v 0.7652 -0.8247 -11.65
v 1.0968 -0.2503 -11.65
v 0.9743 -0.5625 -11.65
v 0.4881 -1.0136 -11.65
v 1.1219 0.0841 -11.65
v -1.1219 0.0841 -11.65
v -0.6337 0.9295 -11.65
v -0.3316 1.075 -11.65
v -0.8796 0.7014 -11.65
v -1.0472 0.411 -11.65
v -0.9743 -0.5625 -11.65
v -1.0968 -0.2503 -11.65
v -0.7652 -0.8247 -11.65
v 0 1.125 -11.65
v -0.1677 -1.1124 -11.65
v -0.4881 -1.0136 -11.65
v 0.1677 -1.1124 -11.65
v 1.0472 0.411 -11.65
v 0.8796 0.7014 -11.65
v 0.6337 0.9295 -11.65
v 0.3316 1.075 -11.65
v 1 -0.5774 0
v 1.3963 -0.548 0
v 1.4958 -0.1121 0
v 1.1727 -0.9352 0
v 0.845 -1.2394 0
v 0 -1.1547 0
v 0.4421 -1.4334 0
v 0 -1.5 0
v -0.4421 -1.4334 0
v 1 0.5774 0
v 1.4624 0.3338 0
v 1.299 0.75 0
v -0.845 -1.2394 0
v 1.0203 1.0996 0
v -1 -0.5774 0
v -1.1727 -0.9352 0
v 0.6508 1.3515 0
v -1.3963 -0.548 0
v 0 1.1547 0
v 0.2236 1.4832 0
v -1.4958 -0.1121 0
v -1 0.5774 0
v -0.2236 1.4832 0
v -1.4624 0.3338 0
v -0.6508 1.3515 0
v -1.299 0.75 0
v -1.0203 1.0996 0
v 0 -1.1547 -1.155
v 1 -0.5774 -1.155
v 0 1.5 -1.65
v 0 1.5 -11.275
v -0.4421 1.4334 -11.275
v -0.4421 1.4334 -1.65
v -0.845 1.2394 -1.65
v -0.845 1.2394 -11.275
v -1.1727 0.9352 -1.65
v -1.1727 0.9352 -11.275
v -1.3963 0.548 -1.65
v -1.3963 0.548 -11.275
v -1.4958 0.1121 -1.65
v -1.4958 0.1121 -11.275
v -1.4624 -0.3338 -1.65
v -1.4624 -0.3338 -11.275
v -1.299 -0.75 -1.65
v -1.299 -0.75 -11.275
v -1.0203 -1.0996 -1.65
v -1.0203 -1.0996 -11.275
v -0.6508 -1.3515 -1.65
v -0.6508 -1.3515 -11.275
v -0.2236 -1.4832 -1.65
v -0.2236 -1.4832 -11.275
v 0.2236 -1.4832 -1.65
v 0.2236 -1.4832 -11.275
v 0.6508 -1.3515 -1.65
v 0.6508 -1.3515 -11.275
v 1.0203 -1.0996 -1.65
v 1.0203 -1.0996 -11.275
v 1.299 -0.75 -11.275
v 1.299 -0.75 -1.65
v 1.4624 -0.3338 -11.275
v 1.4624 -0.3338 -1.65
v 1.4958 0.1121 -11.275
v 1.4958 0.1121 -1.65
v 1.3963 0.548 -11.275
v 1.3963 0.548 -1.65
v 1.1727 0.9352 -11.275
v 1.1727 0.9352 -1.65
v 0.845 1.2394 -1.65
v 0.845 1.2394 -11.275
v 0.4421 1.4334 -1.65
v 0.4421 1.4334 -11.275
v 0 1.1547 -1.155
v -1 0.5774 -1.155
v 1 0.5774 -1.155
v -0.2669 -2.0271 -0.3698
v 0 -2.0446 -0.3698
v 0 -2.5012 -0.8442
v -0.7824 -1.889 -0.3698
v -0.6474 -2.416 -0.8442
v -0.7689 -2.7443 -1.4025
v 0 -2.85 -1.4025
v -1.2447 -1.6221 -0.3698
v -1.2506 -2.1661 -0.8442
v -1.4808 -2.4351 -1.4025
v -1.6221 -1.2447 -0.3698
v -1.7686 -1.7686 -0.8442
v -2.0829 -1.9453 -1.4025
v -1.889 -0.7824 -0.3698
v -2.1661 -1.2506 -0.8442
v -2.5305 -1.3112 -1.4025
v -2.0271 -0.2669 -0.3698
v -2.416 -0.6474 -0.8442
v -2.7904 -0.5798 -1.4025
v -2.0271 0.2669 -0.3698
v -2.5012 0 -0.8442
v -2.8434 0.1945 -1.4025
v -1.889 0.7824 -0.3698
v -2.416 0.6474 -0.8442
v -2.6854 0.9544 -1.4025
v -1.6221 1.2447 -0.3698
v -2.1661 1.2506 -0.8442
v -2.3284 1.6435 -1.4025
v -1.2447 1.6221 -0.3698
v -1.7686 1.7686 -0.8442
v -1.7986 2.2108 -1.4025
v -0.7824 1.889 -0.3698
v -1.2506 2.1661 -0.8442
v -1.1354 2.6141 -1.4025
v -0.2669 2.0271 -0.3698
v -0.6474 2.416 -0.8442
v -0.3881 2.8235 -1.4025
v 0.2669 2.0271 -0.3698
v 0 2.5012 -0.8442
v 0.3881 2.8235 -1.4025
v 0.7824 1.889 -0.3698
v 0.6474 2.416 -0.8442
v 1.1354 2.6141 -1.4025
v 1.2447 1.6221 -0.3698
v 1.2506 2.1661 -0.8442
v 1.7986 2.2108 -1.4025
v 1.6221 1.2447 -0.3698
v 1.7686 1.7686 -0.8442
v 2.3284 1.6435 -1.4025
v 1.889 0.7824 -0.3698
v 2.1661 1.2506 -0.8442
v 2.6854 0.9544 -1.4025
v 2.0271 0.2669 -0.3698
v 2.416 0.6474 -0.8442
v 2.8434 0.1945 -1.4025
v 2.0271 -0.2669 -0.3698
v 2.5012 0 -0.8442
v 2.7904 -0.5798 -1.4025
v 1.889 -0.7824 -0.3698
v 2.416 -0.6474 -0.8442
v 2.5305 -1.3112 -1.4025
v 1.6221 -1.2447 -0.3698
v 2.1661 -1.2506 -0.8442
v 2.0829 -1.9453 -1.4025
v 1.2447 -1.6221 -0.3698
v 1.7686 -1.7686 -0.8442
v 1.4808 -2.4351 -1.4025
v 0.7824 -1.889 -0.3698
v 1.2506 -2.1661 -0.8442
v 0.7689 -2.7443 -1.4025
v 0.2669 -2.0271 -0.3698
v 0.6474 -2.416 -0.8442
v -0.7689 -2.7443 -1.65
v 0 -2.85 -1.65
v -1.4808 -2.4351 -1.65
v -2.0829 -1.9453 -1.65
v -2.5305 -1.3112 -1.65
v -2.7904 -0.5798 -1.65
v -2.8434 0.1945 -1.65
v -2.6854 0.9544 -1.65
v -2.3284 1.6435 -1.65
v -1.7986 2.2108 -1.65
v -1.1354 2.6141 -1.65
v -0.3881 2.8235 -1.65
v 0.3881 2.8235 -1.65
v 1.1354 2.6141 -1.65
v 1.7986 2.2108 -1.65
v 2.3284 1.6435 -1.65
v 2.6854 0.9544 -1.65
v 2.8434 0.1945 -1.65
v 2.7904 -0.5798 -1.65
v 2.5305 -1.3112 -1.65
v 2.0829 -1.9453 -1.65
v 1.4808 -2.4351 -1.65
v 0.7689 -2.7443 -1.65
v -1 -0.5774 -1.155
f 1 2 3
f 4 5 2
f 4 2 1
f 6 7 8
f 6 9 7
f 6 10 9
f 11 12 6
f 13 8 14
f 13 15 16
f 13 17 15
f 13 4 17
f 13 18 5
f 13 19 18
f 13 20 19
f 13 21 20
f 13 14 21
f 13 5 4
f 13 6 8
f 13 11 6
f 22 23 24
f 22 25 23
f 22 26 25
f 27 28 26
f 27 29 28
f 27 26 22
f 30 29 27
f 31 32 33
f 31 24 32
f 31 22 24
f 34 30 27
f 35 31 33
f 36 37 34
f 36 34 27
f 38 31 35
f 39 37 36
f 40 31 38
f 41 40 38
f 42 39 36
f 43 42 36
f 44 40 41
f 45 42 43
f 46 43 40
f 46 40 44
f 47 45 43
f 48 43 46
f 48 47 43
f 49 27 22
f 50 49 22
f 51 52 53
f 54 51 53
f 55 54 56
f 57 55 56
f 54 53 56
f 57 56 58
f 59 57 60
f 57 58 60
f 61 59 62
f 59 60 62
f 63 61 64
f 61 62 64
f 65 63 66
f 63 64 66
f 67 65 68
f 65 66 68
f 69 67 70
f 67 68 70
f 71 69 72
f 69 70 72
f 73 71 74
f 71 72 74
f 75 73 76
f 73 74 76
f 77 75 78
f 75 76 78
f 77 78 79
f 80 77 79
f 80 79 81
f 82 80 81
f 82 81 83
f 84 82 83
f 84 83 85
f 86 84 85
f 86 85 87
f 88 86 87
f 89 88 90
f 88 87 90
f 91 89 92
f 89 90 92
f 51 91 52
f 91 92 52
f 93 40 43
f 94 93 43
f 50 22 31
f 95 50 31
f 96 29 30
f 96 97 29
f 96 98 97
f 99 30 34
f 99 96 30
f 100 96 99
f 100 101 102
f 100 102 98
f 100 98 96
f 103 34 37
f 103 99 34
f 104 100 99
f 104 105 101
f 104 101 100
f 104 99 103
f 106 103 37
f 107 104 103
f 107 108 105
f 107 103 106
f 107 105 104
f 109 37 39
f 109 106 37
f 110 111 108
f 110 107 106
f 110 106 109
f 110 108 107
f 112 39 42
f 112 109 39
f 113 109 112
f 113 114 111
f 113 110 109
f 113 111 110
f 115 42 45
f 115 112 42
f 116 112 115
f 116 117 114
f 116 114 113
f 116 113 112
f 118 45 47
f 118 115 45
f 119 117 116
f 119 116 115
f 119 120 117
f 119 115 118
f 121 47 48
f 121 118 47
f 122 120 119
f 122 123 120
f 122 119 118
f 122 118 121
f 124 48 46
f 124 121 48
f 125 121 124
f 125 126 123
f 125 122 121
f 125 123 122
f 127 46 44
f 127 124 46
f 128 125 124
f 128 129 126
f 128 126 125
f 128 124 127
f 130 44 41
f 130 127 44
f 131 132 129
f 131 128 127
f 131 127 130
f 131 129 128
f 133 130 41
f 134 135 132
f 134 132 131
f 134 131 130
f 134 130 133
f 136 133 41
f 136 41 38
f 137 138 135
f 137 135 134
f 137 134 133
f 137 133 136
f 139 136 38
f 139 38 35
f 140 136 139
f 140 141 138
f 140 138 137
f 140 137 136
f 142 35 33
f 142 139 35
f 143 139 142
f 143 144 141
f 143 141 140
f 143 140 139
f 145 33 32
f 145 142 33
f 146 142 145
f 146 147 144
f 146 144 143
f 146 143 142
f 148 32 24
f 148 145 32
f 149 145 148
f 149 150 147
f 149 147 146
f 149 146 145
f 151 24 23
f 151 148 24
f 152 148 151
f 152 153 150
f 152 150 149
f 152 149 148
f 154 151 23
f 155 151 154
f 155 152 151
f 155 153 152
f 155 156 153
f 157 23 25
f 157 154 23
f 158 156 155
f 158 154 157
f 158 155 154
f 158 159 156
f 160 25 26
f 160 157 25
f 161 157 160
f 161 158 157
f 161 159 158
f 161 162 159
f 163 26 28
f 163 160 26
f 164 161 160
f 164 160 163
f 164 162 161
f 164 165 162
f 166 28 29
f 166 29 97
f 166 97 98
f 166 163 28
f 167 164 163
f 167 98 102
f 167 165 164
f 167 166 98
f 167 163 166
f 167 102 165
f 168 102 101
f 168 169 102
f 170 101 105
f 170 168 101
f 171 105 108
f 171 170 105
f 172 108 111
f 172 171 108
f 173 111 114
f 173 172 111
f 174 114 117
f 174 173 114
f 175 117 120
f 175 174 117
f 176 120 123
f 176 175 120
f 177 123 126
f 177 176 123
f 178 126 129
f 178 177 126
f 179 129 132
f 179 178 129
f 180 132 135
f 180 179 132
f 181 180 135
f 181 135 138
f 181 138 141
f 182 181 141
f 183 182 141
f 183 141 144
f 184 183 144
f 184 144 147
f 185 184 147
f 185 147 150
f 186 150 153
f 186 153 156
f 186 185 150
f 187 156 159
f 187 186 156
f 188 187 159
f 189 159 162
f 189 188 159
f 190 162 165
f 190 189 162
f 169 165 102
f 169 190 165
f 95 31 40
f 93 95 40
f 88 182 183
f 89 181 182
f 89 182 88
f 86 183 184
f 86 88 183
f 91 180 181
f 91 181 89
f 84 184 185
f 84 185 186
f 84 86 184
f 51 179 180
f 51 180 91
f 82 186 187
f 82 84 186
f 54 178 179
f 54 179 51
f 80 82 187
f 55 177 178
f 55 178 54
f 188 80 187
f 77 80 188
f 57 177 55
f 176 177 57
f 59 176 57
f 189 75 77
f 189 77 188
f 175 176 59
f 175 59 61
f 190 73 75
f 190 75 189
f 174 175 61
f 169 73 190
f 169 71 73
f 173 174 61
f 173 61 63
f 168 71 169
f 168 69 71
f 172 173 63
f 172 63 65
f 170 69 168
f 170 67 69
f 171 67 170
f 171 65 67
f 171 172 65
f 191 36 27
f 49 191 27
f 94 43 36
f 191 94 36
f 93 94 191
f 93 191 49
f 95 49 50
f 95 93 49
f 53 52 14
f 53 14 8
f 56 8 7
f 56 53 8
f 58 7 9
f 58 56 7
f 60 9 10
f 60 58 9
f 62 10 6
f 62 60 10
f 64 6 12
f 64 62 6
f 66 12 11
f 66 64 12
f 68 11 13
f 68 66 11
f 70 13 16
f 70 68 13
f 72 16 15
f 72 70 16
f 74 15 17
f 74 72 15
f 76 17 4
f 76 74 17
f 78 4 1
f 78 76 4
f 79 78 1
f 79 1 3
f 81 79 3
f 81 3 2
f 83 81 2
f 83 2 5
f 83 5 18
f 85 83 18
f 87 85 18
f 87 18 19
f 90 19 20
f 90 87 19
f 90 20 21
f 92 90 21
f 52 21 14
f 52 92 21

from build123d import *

# Parameters (mm, degrees)
SKETCH1_W          = 10
SKETCH1_H          = 1.5
CHAMFER1_SIZE      = 0.375
CUT_EXTRUDE2_DEPTH = 1.155


with BuildPart() as part:
    # Sketch1 → Revolve1 (revolve)
    with BuildSketch(Plane(origin=(0, 0, 0), x_dir=(0, 0, -1), z_dir=(1, 0, 0))):
        with Locations((6.65, 0.75)):
            Rectangle(SKETCH1_W, SKETCH1_H)
    revolve(axis=Axis((0, 0, -11.65), (0, 0, 1)))

    # Chamfer1
    chamfer1_edges = [part.edges().sort_by_distance(p)[0] for p in [
        (0, -1.5, -11.65),
    ]]
    chamfer(chamfer1_edges, length=CHAMFER1_SIZE)

    # Sketch7 → Revolve2 (revolve)
    with BuildSketch(Plane(origin=(0, 0, 0), x_dir=(0, 0, -1), z_dir=(1, 0, 0))):
        with BuildLine():
            Line((1.4025, 2.85), (1.65, 2.85))
            Line((1.65, 2.85), (1.65, 0))
            Line((1.65, 0), (0, 0))
            Line((0, 0), (0, 1.5))
            ThreePointArc((0, 1.5), (0.59512511, 2.285251969), (1.4025, 2.85))
        make_face()
    revolve(axis=Axis((0, 0, 0), (0, 0, -1)))

    # Sketch5 → Cut-Extrude2 (cut)
    with BuildSketch(Plane.XY):
        Polygon((1, -0.577350269), (1, 0.577350269), (0, 1.154700538), (-1, 0.577350269), (-1, -0.577350269), (0, -1.154700538), align=None)
    extrude(amount=-CUT_EXTRUDE2_DEPTH, mode=Mode.SUBTRACT)


solid = part.part
